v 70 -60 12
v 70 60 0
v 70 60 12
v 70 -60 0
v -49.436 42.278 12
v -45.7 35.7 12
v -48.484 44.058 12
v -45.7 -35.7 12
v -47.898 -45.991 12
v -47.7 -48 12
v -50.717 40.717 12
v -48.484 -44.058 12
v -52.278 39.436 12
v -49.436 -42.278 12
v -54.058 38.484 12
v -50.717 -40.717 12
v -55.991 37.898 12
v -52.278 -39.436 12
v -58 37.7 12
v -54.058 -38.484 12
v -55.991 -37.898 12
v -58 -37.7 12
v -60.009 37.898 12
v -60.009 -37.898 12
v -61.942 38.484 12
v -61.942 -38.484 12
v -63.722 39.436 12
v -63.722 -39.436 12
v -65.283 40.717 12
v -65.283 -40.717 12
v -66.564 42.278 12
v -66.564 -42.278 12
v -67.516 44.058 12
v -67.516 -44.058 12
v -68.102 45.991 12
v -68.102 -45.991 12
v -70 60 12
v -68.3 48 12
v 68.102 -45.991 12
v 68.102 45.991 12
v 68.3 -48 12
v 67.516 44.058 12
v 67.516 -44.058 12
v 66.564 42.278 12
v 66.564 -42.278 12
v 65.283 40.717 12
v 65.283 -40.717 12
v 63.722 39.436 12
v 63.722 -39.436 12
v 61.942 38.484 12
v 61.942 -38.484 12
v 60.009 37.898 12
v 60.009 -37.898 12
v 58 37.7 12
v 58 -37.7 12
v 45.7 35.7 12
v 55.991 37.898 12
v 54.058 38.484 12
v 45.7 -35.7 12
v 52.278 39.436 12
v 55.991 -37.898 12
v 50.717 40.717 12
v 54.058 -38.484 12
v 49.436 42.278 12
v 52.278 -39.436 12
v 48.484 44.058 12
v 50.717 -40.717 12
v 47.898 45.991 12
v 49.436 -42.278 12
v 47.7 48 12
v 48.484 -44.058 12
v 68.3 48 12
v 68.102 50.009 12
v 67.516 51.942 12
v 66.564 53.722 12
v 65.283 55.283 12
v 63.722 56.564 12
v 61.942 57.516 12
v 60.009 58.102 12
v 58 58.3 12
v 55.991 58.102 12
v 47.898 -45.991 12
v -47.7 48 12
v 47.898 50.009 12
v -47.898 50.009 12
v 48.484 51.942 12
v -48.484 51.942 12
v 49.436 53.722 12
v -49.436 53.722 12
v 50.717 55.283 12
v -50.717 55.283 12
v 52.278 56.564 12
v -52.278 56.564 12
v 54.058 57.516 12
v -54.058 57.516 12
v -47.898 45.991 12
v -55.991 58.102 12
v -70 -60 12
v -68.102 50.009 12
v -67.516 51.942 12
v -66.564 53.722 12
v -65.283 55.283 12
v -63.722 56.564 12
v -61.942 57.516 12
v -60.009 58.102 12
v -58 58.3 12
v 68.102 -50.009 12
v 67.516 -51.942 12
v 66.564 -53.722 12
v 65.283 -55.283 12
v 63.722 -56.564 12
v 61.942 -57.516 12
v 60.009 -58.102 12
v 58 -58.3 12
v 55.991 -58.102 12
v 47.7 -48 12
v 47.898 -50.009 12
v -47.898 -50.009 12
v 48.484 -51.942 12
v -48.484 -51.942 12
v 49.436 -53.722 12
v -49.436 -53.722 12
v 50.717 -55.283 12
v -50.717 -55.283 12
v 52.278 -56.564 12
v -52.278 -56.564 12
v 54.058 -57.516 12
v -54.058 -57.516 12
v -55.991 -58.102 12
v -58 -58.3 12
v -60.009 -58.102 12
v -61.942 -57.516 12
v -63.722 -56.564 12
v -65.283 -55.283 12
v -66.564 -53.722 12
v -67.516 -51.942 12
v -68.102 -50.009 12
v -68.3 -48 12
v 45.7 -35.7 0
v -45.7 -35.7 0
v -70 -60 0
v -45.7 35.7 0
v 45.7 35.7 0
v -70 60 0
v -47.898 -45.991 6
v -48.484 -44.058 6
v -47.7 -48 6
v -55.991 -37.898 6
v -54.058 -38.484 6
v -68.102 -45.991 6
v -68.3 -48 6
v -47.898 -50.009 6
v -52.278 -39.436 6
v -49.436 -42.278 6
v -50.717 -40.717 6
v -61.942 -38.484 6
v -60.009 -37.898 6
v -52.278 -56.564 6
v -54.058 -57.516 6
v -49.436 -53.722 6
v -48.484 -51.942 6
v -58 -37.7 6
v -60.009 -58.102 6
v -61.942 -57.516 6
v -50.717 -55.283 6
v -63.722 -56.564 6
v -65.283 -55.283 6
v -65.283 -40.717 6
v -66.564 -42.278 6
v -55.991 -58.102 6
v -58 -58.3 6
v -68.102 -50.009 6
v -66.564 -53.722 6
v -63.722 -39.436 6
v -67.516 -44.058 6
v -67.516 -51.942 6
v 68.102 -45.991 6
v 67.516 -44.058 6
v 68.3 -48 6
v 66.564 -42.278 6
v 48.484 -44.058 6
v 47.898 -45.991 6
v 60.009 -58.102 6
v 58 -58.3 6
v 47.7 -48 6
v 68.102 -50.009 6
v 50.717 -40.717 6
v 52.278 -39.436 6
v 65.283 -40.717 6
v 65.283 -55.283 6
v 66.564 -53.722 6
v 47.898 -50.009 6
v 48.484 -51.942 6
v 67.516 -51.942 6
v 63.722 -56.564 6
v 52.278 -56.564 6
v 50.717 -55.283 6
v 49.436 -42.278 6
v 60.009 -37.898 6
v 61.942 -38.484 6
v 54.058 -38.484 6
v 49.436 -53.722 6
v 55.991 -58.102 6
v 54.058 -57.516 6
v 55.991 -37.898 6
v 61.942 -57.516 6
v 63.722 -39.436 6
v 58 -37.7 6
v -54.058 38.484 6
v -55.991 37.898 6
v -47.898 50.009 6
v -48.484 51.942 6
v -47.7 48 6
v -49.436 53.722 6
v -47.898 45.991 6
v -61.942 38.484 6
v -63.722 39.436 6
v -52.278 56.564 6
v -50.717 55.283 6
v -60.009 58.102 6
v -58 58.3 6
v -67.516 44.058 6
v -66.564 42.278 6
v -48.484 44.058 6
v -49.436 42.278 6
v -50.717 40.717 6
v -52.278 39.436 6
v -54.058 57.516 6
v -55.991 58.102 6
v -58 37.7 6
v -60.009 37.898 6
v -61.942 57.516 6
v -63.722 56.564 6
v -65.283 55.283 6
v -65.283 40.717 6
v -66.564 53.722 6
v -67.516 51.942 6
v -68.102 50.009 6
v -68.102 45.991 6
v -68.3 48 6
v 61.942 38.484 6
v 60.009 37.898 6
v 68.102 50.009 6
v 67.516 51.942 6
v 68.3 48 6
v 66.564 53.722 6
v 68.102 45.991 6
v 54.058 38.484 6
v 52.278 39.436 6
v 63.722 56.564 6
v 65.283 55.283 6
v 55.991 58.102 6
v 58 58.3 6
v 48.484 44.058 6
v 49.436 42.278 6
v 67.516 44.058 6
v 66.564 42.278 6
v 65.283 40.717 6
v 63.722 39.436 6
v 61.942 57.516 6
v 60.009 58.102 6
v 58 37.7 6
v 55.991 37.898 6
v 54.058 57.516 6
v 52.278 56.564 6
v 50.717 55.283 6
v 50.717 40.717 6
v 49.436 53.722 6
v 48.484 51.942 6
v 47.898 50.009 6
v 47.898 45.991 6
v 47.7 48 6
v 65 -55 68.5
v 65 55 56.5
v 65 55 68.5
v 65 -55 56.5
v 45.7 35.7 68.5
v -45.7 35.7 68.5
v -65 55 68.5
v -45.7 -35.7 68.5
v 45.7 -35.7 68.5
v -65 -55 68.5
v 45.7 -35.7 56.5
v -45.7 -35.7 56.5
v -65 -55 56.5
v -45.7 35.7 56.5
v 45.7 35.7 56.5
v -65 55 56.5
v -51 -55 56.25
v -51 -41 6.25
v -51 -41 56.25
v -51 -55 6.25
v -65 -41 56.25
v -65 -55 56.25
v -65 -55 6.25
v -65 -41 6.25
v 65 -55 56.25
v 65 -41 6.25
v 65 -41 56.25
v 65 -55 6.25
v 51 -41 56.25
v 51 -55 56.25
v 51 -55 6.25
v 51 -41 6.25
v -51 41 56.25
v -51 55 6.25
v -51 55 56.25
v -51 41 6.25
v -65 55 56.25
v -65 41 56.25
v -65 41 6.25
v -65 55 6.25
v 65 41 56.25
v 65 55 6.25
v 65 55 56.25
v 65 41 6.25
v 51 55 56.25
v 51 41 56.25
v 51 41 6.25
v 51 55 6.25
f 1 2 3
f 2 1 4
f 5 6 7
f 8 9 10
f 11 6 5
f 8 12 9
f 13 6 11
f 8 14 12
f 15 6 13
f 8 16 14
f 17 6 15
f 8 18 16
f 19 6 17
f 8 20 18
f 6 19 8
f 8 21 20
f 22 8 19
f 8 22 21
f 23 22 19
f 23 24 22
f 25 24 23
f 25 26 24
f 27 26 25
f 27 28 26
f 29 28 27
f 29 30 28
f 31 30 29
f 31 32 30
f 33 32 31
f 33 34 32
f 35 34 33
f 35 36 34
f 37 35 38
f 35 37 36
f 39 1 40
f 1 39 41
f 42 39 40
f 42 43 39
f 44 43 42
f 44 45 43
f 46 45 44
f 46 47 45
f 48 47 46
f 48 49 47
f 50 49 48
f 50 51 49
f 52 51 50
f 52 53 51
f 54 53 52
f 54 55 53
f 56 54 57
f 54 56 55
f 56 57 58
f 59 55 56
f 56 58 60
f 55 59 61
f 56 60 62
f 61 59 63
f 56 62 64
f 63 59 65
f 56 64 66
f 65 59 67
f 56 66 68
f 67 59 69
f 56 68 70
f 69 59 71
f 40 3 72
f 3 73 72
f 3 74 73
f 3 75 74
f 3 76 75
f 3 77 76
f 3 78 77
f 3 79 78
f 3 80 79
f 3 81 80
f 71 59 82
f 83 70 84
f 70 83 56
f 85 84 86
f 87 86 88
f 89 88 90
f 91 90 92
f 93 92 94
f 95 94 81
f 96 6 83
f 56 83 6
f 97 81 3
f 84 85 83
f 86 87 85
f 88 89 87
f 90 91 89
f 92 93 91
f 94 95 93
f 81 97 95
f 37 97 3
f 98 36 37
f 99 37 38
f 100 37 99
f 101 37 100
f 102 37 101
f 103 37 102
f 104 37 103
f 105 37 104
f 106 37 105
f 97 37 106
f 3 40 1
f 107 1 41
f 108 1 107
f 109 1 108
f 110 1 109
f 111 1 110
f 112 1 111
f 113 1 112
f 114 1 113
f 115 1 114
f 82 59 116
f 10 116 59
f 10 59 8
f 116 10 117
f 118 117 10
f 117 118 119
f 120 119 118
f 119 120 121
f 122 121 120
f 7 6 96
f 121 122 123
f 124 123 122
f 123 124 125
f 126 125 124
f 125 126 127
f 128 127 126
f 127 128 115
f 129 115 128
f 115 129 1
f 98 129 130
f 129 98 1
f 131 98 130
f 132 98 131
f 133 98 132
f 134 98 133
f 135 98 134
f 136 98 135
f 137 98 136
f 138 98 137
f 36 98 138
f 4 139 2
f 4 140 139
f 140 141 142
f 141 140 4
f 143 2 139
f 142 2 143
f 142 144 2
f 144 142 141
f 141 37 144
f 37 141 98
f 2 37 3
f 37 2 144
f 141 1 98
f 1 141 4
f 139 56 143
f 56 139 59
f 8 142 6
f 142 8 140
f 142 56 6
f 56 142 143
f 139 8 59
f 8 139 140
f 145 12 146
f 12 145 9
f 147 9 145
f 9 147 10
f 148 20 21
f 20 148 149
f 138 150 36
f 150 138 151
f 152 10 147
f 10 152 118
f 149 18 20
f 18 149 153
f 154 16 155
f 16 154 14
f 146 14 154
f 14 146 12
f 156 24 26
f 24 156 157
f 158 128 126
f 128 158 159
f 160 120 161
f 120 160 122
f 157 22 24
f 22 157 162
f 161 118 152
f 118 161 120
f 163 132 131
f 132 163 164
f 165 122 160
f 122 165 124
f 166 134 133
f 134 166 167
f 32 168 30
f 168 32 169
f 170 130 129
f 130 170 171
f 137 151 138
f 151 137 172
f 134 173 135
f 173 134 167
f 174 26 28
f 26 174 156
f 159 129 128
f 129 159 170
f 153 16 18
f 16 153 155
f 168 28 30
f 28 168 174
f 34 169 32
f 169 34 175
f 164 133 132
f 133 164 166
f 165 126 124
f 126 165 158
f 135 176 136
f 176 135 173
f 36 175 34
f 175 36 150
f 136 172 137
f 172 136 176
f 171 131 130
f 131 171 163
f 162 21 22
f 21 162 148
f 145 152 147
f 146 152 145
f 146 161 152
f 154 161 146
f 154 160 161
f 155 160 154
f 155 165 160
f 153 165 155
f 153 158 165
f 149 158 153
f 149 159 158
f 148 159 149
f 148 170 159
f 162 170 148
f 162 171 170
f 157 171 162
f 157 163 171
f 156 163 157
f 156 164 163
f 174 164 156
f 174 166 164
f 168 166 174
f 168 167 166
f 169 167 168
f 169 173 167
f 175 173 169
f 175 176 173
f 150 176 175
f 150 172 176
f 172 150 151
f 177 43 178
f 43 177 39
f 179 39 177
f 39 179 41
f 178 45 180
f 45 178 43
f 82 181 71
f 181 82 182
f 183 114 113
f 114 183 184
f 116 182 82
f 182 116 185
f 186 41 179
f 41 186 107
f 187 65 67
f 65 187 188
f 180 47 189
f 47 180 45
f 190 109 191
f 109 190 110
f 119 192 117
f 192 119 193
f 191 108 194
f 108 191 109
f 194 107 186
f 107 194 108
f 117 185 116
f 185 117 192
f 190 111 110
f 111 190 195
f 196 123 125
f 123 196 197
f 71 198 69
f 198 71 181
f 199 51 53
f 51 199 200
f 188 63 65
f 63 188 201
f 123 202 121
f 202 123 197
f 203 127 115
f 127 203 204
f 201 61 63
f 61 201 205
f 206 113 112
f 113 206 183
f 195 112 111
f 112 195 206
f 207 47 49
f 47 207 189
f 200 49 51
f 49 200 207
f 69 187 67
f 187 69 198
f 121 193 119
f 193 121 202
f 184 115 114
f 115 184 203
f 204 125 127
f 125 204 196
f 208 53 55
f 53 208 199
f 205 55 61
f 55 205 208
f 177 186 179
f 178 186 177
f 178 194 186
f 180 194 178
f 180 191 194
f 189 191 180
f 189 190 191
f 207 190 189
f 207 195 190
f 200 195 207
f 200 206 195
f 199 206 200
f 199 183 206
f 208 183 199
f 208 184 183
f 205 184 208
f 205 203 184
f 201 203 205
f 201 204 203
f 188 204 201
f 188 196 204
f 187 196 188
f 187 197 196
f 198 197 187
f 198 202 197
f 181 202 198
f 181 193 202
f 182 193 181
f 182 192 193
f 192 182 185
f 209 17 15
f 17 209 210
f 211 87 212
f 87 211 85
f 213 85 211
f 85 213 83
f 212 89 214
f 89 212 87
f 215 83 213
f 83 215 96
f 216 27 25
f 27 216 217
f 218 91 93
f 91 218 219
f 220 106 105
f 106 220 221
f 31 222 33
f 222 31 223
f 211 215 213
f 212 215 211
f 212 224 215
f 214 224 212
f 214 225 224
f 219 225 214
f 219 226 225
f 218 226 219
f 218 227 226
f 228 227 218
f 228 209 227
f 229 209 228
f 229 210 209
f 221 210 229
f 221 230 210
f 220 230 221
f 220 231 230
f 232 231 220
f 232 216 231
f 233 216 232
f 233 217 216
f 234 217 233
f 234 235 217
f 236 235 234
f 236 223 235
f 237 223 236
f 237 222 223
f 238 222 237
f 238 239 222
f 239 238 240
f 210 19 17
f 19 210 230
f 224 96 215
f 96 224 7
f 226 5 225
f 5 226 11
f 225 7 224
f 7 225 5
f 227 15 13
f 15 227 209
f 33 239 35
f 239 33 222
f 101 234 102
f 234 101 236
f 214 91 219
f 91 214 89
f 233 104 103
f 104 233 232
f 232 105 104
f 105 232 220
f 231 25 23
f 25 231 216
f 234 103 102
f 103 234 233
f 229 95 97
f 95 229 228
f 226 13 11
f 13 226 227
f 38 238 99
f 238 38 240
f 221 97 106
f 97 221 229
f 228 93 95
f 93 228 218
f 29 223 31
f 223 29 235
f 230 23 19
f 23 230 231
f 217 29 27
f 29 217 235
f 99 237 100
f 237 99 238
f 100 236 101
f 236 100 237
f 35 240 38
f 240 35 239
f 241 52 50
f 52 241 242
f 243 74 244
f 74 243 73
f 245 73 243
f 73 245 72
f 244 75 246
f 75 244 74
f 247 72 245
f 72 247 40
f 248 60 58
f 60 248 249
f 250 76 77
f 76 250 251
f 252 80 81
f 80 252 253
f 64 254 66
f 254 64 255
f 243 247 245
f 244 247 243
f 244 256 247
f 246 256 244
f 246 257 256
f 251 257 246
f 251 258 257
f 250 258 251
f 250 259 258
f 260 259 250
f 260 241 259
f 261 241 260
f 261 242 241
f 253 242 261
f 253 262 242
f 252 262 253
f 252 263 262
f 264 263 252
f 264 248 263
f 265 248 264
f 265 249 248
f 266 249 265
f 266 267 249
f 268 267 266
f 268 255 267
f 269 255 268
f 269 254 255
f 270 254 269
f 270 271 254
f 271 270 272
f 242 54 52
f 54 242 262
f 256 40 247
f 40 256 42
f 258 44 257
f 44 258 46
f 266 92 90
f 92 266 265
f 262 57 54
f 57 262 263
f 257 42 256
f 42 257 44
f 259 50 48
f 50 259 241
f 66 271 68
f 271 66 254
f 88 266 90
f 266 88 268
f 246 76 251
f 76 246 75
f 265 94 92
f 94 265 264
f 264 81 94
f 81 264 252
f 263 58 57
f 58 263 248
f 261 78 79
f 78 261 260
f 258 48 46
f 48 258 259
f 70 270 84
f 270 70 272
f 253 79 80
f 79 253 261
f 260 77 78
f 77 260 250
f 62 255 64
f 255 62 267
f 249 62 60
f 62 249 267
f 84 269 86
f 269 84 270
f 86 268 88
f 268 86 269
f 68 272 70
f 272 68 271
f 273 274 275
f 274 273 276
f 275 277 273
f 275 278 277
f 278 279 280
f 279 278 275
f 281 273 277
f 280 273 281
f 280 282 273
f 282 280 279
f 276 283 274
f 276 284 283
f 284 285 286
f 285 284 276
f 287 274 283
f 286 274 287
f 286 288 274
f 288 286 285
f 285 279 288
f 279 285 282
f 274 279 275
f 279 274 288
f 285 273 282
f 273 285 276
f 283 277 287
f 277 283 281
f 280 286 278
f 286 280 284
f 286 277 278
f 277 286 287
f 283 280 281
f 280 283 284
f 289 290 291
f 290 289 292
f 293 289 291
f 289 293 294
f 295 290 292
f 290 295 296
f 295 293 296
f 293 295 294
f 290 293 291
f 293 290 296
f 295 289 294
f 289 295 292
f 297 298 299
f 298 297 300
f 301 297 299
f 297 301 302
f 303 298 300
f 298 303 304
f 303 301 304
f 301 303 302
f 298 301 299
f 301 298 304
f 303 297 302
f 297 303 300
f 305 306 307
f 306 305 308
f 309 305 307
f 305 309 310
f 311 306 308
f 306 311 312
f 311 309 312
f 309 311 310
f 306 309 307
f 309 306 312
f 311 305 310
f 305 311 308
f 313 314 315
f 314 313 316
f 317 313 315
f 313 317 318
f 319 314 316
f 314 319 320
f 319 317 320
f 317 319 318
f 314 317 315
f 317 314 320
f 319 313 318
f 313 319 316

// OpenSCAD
$fn = 32;

// ------------------------------------------------------------------------
// Frame cube: base 140 x 120 mm, posts 50 mm tall
// Every part is its own module, assembly() places every instance.
// ------------------------------------------------------------------------

// --- part 1 ---
module base_frame() {
  difference() {
    translate([-70, -60, 0]) cube([140, 120, 12]);
    translate([-45.7, -35.7, -1]) cube([91.4, 71.4, 14]);
    translate([-58, -48, 6]) cylinder(h = 7, d = 20.6);
    translate([58, -48, 6]) cylinder(h = 7, d = 20.6);
    translate([-58, 48, 6]) cylinder(h = 7, d = 20.6);
    translate([58, 48, 6]) cylinder(h = 7, d = 20.6);
  }
}

// --- part 2 ---
module corner_post() {
  translate([-7, -7, 0]) cube([14, 14, 50]);
}

// --- part 3 ---
module top_frame() {
  difference() {
    translate([-65, -55, 0]) cube([130, 110, 12]);
    translate([-45.7, -35.7, -1]) cube([91.4, 71.4, 14]);
  }
}

// --- assembly ---
module assembly() {
  color([0.80, 0.24, 0.20]) translate([0, 0, 0]) rotate([0, 0, 0]) base_frame();
  color([0.20, 0.45, 0.75]) translate([-58, -48, 6.25]) rotate([0, 0, 0]) corner_post();
  color([0.25, 0.62, 0.32]) translate([58, -48, 6.25]) rotate([0, 0, 0]) corner_post();
  color([0.92, 0.70, 0.18]) translate([-58, 48, 6.25]) rotate([0, 0, 0]) corner_post();
  color([0.58, 0.35, 0.70]) translate([58, 48, 6.25]) rotate([0, 0, 0]) corner_post();
  color([0.16, 0.66, 0.66]) translate([0, 0, 56.5]) rotate([0, 0, 0]) top_frame();
}

assembly();
